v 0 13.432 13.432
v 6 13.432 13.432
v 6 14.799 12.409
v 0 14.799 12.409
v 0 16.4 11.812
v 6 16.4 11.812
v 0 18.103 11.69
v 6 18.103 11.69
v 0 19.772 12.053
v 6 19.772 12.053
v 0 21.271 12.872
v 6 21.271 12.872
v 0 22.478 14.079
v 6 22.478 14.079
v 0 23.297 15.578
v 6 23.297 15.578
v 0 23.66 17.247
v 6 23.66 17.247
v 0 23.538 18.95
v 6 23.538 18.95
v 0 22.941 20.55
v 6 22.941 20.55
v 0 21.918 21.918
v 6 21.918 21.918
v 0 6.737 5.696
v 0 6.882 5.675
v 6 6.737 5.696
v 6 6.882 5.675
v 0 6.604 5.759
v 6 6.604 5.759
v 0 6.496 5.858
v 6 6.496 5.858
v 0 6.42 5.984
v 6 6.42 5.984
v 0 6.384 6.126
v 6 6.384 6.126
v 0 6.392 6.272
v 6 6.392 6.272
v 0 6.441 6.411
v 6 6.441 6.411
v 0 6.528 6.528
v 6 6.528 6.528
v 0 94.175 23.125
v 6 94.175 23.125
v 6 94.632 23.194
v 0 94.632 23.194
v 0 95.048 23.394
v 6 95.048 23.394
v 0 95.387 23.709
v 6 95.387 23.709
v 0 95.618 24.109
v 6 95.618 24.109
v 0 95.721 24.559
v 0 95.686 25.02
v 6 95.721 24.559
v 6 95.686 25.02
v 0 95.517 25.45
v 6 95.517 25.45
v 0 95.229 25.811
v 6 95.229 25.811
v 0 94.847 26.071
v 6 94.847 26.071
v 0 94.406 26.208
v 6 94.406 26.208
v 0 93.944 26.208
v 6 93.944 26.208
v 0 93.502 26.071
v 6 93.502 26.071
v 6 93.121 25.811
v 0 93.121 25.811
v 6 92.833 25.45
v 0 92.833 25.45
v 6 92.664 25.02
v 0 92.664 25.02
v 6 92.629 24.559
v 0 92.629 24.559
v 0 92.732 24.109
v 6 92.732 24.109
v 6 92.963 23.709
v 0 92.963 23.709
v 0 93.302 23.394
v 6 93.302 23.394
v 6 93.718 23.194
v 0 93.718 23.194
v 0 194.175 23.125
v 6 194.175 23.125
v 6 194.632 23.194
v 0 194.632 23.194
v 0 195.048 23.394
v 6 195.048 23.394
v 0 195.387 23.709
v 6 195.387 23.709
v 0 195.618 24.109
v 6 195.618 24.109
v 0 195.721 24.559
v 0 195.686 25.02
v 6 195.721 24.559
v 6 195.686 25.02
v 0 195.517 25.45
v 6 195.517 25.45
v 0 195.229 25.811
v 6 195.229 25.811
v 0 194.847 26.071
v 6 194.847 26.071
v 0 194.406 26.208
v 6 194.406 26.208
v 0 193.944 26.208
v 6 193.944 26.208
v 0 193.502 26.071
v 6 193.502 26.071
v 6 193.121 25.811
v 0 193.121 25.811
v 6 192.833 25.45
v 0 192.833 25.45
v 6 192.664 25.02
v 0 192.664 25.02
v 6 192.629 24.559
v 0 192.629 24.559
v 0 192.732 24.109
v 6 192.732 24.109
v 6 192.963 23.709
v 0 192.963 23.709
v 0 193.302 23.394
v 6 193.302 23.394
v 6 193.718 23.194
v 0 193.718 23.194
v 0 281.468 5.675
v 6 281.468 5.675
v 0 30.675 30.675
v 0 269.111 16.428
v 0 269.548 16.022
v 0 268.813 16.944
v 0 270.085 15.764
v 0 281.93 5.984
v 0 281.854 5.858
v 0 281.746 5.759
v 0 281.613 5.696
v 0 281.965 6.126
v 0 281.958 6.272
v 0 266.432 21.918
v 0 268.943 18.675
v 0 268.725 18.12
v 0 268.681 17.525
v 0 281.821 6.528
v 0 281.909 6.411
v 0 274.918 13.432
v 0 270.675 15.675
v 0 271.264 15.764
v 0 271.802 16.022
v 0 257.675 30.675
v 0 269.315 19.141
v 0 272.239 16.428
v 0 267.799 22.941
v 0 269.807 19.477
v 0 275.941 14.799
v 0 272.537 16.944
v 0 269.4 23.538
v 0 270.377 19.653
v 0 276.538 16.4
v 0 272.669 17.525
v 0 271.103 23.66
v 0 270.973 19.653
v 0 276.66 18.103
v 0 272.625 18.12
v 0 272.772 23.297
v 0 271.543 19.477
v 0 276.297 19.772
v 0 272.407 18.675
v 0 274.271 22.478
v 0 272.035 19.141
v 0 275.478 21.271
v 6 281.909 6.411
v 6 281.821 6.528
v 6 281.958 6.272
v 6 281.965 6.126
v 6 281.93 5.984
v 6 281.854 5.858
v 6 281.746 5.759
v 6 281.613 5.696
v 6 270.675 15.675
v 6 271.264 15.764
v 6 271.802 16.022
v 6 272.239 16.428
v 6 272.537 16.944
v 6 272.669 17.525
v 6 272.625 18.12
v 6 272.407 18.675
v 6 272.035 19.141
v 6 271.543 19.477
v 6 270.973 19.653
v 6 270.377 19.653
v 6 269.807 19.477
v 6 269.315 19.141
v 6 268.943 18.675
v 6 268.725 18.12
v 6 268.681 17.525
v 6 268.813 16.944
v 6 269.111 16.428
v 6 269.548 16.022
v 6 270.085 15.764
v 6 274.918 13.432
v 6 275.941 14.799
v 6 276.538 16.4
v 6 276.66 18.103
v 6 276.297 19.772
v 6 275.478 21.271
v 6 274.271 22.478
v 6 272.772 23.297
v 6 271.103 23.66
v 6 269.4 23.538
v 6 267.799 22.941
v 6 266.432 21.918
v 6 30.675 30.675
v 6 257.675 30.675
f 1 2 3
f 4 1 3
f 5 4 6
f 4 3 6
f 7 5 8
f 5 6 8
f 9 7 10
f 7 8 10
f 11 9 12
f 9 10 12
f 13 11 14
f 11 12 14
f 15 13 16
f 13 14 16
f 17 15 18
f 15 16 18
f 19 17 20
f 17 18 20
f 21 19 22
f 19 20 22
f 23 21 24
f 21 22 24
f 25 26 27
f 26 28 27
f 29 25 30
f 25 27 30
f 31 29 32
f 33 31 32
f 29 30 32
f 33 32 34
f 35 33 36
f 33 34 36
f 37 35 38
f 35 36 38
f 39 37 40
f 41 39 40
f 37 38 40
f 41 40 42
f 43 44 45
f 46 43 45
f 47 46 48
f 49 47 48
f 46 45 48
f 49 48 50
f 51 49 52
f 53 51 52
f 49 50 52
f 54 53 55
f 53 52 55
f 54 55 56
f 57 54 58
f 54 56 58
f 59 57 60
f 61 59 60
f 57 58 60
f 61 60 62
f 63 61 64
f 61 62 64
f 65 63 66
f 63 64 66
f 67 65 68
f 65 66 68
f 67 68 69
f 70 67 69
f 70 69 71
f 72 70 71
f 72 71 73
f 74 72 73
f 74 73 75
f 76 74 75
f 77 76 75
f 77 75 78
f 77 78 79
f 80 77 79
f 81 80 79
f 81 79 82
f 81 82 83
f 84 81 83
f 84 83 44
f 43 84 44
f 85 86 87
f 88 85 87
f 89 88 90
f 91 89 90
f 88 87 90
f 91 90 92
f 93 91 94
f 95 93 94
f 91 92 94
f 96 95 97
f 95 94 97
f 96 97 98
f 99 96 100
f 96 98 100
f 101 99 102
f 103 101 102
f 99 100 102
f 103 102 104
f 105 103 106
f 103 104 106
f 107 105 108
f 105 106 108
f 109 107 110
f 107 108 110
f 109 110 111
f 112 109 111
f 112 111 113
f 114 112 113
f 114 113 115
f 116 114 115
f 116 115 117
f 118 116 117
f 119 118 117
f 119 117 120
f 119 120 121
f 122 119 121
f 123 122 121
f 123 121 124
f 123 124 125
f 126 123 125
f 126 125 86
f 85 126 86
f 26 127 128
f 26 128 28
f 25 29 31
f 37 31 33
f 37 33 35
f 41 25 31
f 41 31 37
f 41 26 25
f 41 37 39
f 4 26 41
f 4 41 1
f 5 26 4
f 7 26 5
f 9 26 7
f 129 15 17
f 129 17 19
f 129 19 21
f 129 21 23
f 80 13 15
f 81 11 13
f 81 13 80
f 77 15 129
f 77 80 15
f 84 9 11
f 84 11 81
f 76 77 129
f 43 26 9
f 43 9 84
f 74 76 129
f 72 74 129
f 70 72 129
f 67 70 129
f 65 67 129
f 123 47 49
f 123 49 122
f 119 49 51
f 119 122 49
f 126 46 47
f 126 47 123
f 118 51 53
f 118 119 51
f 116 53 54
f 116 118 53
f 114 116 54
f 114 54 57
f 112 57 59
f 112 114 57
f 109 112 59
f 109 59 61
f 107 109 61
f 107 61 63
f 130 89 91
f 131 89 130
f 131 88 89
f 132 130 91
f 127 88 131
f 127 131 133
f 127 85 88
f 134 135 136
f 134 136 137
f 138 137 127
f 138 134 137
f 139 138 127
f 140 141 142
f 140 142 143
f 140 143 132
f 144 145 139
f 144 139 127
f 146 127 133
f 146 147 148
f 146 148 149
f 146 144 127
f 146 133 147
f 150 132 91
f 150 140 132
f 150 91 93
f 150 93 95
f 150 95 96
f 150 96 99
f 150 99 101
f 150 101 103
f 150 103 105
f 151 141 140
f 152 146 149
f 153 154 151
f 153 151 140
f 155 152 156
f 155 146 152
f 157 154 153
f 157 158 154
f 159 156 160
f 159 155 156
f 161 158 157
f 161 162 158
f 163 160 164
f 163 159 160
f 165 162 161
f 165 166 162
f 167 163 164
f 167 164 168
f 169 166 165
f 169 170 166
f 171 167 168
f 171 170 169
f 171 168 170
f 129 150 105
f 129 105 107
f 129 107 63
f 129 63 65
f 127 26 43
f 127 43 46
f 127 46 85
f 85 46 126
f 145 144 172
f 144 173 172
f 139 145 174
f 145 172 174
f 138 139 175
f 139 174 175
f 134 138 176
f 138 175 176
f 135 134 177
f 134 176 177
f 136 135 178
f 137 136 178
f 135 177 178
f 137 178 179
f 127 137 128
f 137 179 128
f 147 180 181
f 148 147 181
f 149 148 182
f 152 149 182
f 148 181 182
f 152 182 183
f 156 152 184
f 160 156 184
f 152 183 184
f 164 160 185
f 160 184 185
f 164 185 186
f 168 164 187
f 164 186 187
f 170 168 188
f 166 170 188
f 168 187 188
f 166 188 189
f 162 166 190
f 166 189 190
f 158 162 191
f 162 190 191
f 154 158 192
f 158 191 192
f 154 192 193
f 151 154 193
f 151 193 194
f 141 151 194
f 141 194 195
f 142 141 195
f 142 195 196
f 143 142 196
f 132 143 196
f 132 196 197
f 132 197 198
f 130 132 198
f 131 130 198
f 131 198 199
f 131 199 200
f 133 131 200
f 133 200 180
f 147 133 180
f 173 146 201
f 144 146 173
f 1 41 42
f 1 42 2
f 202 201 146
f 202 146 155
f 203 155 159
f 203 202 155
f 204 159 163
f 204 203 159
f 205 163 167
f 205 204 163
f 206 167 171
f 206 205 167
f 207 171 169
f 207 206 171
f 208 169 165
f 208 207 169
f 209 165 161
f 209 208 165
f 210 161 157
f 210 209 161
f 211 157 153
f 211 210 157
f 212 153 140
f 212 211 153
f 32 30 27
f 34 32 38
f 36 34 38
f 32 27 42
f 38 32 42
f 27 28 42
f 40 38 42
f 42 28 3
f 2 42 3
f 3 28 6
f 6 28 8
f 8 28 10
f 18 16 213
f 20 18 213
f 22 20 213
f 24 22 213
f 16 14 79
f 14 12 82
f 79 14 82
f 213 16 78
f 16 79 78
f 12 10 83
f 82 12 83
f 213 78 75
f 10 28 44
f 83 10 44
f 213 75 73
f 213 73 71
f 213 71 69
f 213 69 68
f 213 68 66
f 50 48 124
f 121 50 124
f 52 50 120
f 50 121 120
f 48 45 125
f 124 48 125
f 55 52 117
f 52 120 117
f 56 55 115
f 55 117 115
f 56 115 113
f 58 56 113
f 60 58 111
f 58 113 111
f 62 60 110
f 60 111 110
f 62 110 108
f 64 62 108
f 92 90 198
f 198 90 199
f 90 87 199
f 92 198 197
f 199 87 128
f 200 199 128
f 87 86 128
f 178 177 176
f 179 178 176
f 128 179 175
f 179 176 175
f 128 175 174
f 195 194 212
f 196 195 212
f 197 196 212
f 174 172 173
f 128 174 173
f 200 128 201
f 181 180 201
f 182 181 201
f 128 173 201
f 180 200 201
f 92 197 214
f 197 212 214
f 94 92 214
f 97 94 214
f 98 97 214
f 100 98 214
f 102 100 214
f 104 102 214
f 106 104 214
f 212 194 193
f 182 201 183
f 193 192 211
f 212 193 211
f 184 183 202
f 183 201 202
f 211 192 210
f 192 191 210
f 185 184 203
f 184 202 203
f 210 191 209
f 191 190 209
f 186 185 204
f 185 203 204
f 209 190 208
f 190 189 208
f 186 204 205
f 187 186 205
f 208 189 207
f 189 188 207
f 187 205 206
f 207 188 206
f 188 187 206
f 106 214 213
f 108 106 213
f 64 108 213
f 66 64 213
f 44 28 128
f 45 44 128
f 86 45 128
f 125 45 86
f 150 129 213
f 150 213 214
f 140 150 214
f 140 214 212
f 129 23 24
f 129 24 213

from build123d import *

# Parameters (mm, degrees)
BOSS_EXTRUDE1_DEPTH = 6
FILLET1_R           = 0.5
SKETCH4_R           = 6
BOSS_EXTRUDE2_DEPTH = 6
SKETCH3_R           = 2
SKETCH3_R_2         = 6
CUT_EXTRUDE1_DEPTH  = 284.694910827
CUT_EXTRUDE2_REACH  = 285.695
SKETCH6_R           = 1.55


with BuildPart() as part:
    # Sketch2 → Boss-Extrude1 (new body)
    with BuildSketch(Plane(origin=(0, 0, 0), x_dir=(0, 0, -1), z_dir=(1, 0, 0))):
        Polygon((-30.67492643, 30.67492643), (-30.67492643, 257.67492643), (-5.67492643, 282.67492643), (-5.67492643, 5.67492643), align=None)
    extrude(amount=BOSS_EXTRUDE1_DEPTH)

    # Fillet1
    fillet1_edges = [part.edges().sort_by_distance(p)[0] for p in [
        (3, 282.67492643, 5.67492643),
        (3, 5.67492643, 5.67492643),
    ]]
    fillet(fillet1_edges, radius=FILLET1_R)

    # Sketch4 → Boss-Extrude2 (add)
    with BuildSketch(Plane(origin=(6, 0, 0), x_dir=(0, 0, -1), z_dir=(1, 0, 0))):
        with Locations((-17.67492643, 270.67492643)):
            Circle(SKETCH4_R)
    extrude(amount=-BOSS_EXTRUDE2_DEPTH)

    # Sketch3 → Cut-Extrude1 (cut, through all)
    with BuildSketch(Plane(origin=(6, 0, 0), x_dir=(0, 0, -1), z_dir=(1, 0, 0))):
        with Locations((-17.67492643, 270.67492643)):
            Circle(SKETCH3_R)
        with Locations((-17.67492643, 17.67492643)):
            Circle(SKETCH3_R_2)
    extrude(amount=-CUT_EXTRUDE1_DEPTH, mode=Mode.SUBTRACT)

    # Sketch6 → Cut-Extrude2 (cut, up to next)
    with BuildSketch(Plane(origin=(6, 0, 0), x_dir=(0, 0, -1), z_dir=(1, 0, 0)), mode=Mode.PRIVATE) as cut_extrude2_sk1:
        with Locations((-24.67492643, 94.17492643)):
            Circle(SKETCH6_R)
    cut_extrude2_tool1 = extrude(cut_extrude2_sk1.sketch, amount=-CUT_EXTRUDE2_REACH, mode=Mode.PRIVATE) & part.part
    # Sketch6 → Cut-Extrude2 (cut, up to next)
    with BuildSketch(Plane(origin=(6, 0, 0), x_dir=(0, 0, -1), z_dir=(1, 0, 0)), mode=Mode.PRIVATE) as cut_extrude2_sk2:
        with Locations((-24.67492643, 194.17492643)):
            Circle(SKETCH6_R)
    cut_extrude2_tool2 = extrude(cut_extrude2_sk2.sketch, amount=-CUT_EXTRUDE2_REACH, mode=Mode.PRIVATE) & part.part
    add(cut_extrude2_tool1.solids().sort_by_distance((6, 94.174926, 24.674926))[0], mode=Mode.SUBTRACT)
    add(cut_extrude2_tool2.solids().sort_by_distance((6, 194.174926, 24.674926))[0], mode=Mode.SUBTRACT)


solid = part.part
